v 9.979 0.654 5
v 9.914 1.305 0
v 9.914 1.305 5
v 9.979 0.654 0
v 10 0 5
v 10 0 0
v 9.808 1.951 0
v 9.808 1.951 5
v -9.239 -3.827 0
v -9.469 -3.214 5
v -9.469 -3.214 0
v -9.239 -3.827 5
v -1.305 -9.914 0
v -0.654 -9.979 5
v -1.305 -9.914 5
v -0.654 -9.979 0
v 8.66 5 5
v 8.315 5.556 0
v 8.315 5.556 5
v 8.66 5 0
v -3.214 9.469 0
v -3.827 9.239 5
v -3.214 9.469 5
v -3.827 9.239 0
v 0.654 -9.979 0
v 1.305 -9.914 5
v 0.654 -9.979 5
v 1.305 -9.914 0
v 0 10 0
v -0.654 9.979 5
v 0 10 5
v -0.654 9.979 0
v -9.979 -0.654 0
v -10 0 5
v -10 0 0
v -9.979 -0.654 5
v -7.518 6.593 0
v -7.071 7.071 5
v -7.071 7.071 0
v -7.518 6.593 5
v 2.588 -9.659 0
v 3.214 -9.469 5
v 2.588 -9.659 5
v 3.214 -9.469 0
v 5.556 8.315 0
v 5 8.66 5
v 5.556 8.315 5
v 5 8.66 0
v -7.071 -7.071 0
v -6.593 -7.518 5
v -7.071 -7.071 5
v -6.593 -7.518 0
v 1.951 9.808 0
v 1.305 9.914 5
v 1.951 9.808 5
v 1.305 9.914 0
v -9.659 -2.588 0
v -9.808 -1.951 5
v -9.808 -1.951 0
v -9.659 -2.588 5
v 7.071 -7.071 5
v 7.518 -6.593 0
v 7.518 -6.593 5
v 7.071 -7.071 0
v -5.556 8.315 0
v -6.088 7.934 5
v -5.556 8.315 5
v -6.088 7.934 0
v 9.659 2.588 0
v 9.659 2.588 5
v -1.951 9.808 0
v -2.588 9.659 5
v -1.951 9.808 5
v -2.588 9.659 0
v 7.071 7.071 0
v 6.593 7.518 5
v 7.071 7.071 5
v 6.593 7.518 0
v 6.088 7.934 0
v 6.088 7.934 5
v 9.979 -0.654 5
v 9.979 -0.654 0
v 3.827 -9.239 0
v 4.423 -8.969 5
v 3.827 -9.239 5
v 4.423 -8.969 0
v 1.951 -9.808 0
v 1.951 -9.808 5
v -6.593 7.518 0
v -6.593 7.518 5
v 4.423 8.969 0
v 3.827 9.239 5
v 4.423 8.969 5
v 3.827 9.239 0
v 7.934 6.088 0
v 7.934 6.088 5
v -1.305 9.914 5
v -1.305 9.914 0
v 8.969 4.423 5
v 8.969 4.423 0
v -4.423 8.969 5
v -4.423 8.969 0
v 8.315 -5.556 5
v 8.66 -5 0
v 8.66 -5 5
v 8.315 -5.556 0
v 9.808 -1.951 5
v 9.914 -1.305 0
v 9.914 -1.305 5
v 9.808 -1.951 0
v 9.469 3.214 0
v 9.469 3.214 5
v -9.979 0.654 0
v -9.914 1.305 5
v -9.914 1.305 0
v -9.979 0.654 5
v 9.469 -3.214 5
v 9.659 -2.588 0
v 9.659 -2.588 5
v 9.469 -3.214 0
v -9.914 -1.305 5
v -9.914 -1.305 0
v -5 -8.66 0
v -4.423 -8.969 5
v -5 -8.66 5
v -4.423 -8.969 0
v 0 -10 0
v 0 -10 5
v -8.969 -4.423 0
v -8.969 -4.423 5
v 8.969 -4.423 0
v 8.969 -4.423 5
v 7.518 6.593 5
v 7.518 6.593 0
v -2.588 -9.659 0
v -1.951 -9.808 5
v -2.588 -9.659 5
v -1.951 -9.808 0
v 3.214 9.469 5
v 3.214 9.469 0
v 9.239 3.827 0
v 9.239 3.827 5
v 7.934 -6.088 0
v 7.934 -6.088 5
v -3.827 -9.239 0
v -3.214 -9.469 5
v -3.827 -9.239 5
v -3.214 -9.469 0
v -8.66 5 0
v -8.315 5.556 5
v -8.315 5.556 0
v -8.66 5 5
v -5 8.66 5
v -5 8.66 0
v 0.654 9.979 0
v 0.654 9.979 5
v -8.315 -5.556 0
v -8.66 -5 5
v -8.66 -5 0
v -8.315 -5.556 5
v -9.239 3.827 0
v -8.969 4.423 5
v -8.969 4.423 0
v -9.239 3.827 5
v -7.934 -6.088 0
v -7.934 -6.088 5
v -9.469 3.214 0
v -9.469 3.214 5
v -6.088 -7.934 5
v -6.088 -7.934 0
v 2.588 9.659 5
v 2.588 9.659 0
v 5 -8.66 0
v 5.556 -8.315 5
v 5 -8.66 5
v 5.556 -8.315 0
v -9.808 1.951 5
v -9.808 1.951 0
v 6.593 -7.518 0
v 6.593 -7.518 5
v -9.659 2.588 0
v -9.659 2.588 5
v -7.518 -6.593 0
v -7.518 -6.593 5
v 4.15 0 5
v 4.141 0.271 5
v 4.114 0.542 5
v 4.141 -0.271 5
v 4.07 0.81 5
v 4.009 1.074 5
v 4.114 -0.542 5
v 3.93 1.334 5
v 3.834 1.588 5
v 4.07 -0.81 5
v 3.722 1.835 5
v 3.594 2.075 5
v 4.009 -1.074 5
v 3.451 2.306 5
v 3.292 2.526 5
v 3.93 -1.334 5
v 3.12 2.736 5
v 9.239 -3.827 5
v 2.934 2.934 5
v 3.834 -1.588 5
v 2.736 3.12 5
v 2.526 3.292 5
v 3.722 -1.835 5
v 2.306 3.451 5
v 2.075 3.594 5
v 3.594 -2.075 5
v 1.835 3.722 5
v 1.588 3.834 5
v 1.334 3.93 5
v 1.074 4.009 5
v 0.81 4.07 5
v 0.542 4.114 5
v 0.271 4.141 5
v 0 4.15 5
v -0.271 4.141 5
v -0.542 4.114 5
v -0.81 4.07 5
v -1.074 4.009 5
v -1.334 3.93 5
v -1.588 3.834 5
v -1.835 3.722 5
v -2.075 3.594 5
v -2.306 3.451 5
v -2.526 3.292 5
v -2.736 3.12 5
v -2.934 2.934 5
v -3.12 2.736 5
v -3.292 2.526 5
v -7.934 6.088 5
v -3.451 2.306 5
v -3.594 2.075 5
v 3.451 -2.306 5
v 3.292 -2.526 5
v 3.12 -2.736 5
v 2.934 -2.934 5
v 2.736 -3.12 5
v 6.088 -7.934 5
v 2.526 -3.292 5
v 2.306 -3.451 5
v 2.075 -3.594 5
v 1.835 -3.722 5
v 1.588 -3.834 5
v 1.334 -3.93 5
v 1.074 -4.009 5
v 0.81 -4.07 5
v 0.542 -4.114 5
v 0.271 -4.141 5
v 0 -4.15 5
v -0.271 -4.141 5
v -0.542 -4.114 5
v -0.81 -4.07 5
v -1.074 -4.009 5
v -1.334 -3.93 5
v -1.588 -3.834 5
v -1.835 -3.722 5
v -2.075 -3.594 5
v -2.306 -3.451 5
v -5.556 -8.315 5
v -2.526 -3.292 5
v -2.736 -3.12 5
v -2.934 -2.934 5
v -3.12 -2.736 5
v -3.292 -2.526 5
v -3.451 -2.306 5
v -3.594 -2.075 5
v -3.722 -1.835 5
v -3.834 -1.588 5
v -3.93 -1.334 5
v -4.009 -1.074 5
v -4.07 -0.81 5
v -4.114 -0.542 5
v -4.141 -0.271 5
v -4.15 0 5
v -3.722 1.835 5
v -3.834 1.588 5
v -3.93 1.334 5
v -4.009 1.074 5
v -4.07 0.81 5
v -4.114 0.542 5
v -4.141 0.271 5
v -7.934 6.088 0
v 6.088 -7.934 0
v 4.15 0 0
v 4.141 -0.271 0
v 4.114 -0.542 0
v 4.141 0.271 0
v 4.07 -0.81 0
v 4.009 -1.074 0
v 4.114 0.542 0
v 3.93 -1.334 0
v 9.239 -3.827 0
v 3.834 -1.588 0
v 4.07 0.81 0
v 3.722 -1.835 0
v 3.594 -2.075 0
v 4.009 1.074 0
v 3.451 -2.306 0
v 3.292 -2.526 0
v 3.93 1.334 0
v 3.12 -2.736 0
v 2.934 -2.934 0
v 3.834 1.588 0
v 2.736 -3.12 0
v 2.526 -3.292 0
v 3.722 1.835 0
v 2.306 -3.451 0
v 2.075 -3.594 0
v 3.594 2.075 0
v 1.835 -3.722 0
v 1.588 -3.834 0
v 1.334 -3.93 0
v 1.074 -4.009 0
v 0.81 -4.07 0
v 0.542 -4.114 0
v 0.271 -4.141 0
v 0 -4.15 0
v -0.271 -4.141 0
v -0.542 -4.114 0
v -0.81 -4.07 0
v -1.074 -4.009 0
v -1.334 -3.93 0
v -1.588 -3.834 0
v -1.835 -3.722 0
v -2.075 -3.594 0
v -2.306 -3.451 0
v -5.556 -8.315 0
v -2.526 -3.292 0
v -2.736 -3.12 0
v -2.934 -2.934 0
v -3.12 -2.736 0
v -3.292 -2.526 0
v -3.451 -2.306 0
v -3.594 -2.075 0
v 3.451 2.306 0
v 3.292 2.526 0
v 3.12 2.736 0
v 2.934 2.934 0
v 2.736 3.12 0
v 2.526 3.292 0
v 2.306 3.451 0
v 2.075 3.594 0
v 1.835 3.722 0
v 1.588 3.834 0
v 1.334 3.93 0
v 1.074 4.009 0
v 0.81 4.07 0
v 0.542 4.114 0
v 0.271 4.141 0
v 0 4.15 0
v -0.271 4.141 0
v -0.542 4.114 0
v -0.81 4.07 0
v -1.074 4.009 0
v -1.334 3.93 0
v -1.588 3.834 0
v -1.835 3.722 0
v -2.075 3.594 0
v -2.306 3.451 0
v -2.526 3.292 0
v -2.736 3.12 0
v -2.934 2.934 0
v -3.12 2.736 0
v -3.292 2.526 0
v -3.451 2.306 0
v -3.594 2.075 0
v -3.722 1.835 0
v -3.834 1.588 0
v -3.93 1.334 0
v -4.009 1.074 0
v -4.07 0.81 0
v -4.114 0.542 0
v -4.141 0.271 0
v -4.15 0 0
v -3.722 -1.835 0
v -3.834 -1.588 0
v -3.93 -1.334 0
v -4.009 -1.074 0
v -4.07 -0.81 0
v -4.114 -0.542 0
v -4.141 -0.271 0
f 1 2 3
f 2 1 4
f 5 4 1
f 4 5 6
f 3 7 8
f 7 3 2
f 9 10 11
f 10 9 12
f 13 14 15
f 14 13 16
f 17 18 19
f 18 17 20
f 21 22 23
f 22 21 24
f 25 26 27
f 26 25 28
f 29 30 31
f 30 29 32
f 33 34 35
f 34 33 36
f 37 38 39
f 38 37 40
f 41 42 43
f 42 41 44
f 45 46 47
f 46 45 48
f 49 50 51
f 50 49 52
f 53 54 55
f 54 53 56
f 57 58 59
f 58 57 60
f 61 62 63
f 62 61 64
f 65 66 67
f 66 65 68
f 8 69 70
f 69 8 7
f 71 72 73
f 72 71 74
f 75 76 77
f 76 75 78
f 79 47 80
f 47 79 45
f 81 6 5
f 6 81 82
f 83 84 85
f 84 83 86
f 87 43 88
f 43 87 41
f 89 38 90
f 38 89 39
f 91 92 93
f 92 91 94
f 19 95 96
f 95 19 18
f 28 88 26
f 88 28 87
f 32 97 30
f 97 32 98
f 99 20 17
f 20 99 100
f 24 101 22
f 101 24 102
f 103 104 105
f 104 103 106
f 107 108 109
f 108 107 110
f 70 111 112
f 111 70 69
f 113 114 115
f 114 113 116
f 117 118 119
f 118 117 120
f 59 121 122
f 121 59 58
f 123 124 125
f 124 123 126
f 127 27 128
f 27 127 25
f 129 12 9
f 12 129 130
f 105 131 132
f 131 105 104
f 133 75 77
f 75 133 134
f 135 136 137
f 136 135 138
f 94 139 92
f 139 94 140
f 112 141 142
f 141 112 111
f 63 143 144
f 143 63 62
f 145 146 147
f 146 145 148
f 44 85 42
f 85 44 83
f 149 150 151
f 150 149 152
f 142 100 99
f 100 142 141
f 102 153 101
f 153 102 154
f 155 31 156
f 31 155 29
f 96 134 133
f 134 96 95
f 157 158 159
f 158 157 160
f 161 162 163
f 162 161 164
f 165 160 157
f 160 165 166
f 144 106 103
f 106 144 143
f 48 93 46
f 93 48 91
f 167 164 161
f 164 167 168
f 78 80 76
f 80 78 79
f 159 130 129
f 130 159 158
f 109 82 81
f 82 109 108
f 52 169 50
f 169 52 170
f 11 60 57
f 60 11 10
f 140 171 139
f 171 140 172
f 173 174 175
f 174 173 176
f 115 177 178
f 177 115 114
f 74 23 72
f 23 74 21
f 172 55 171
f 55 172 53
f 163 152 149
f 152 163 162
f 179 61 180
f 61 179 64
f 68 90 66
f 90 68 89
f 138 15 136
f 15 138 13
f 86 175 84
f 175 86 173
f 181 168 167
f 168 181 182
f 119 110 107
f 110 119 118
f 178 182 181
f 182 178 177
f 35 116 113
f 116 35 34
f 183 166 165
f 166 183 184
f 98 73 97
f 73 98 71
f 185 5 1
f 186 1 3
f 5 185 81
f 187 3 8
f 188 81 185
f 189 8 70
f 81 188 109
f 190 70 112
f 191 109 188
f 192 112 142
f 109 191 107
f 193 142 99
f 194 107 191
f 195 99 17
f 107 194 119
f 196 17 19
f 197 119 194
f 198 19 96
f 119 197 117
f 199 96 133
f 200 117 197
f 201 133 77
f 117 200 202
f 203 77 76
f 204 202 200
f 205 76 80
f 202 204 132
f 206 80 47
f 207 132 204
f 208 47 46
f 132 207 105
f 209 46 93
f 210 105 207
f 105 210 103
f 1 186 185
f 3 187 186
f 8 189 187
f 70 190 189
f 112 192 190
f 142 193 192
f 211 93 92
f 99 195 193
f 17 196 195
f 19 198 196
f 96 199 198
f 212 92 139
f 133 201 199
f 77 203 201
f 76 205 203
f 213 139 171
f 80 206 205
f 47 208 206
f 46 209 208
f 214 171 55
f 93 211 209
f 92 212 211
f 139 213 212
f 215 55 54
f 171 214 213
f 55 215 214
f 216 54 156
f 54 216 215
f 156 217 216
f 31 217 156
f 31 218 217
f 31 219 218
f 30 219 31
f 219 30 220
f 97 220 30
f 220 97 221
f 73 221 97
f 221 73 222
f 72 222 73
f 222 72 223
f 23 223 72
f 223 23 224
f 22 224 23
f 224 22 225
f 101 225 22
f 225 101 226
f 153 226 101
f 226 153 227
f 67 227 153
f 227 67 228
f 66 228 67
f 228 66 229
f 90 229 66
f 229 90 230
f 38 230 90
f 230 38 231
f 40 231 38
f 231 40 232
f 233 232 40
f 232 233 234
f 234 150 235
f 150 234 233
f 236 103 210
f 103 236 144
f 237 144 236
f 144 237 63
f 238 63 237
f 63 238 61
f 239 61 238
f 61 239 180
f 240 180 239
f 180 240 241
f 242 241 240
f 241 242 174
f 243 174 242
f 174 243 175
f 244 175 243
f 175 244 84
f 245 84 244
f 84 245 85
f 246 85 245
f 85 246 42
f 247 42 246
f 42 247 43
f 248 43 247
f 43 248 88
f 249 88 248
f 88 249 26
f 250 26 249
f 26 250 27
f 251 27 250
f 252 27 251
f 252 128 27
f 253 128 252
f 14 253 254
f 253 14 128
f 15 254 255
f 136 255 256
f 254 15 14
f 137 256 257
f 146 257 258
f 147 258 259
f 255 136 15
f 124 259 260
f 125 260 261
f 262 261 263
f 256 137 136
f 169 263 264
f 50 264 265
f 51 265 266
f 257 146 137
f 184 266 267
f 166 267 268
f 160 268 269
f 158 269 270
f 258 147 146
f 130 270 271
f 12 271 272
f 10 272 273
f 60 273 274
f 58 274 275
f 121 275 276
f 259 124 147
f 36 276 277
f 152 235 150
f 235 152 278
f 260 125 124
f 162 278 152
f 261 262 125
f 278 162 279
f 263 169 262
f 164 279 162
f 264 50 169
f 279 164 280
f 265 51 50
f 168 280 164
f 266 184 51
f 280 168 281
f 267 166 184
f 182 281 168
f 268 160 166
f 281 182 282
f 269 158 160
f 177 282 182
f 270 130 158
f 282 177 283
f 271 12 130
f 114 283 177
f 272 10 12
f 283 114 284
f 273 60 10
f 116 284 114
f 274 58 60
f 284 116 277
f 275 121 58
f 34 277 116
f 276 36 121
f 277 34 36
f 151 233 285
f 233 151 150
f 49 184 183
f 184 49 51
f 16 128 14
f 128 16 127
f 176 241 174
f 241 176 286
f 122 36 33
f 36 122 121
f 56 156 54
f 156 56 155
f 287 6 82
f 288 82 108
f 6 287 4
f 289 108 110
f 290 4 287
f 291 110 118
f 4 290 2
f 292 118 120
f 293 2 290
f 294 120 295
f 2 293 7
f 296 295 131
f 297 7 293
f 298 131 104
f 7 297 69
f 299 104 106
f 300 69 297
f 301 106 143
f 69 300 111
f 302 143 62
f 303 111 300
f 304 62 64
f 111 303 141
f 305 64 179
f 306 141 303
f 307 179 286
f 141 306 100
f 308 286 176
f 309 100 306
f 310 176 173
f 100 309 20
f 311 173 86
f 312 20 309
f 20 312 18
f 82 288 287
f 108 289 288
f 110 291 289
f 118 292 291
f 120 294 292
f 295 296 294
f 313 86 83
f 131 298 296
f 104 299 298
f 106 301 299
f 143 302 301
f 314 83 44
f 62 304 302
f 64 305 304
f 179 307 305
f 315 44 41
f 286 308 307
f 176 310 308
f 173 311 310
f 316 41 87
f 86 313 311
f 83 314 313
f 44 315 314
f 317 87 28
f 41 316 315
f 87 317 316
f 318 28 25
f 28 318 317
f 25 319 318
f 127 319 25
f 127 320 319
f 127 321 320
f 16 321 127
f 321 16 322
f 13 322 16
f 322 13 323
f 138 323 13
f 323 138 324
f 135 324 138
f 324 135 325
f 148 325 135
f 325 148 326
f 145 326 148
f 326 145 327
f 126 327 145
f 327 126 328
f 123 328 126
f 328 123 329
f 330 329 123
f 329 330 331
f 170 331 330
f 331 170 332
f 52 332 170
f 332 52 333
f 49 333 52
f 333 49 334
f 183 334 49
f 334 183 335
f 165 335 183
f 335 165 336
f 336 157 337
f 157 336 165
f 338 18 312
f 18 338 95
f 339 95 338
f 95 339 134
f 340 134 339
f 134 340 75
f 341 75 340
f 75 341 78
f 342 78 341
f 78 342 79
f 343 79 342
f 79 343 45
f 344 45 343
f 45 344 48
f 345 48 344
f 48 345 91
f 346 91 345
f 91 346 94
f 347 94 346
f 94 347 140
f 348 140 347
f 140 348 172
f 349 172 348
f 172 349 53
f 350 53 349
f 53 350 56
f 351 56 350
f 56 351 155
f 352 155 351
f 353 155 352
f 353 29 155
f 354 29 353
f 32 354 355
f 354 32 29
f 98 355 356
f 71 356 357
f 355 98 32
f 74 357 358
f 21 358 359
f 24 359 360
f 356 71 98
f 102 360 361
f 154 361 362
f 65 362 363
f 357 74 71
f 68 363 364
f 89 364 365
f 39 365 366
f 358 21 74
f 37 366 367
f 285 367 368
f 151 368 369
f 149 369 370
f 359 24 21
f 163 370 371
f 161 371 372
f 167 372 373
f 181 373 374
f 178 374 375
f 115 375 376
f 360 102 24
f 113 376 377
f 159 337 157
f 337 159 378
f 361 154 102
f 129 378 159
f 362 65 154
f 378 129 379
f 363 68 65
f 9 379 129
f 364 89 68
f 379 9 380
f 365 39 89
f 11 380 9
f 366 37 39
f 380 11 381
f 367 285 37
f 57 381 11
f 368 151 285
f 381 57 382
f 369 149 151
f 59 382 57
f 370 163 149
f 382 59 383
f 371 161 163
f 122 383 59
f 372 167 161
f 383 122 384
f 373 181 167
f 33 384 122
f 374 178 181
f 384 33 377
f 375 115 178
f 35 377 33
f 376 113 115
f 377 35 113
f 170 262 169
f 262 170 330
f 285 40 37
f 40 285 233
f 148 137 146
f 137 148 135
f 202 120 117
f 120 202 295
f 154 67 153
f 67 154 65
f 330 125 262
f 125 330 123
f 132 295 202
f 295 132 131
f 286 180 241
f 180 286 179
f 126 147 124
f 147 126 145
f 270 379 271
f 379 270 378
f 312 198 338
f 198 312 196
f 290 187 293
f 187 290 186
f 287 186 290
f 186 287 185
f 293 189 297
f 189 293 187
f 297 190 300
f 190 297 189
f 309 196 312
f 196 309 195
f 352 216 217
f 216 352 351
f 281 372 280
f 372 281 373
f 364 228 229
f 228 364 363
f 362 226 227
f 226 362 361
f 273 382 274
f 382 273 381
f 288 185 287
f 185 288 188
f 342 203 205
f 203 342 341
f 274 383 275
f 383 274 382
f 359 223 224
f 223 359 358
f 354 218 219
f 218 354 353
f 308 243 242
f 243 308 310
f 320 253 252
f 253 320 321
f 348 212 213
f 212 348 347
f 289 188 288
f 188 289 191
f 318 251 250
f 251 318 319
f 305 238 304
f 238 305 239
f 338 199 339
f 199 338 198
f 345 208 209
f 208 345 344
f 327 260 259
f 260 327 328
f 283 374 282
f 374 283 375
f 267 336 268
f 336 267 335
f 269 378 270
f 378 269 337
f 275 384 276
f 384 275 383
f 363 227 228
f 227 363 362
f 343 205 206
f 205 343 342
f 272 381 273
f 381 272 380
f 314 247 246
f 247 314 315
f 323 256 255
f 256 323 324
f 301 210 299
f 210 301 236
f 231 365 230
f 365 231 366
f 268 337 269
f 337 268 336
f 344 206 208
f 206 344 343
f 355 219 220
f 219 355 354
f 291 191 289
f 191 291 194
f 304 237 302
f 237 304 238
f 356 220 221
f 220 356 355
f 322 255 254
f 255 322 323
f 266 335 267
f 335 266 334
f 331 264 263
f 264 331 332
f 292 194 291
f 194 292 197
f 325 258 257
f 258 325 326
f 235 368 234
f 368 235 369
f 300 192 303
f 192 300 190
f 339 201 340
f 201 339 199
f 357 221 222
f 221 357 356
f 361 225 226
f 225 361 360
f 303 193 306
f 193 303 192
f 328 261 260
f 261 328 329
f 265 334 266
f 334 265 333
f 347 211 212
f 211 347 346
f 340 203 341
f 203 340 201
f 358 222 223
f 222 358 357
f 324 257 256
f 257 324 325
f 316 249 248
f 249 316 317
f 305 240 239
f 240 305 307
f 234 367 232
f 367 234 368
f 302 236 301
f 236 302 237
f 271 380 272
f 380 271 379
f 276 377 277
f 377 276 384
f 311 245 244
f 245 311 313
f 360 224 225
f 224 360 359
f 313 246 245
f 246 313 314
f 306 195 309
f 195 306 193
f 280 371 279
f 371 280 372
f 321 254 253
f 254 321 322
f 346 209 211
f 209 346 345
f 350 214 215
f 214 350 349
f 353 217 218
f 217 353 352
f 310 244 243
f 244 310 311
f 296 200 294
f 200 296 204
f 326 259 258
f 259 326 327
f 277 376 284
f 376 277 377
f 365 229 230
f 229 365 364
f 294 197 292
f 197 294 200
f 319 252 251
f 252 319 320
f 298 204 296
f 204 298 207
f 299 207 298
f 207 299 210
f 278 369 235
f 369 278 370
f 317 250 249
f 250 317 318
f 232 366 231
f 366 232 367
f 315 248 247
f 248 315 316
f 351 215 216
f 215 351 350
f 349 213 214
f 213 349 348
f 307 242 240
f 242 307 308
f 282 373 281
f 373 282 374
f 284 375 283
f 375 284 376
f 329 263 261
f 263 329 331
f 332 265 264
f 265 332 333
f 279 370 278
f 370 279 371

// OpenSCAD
// Spacer / washer
// Hope Arising EPICS team (ASU) - original design. License: CC BY 4.0 (commercial use allowed).
// Prints flat, no supports. Use for spacing out shelves, wheels, brackets and fan mounts.

/* [Size] */
// Outside diameter of the spacer (across the flats for a hexagon)
outer_diameter = 20;      // [5:0.5:100]
// Diameter of the bolt or rod that goes through it. A little extra is added so it fits.
bolt_diameter = 8;        // [1:0.1:80]
// Height (thickness) of the spacer
height = 5;               // [0.6:0.2:100]

/* [Shape] */
// Outside shape
shape = 0;                // [0:Round, 1:Hexagon]

/* [Hidden] */
$fn = 96;
hole_clearance = 0.3;     // printed holes come out slightly small
min_wall = 1.2;

module spacer() {
    hole_d = bolt_diameter + hole_clearance;
    od = max(outer_diameter, hole_d + 2 * min_wall);
    difference() {
        if (shape == 1)
            cylinder(h = height, r = od / 2 / cos(30), $fn = 6);
        else
            cylinder(h = height, d = od);
        translate([0, 0, -1]) cylinder(h = height + 2, d = hole_d);
    }
}

spacer();
